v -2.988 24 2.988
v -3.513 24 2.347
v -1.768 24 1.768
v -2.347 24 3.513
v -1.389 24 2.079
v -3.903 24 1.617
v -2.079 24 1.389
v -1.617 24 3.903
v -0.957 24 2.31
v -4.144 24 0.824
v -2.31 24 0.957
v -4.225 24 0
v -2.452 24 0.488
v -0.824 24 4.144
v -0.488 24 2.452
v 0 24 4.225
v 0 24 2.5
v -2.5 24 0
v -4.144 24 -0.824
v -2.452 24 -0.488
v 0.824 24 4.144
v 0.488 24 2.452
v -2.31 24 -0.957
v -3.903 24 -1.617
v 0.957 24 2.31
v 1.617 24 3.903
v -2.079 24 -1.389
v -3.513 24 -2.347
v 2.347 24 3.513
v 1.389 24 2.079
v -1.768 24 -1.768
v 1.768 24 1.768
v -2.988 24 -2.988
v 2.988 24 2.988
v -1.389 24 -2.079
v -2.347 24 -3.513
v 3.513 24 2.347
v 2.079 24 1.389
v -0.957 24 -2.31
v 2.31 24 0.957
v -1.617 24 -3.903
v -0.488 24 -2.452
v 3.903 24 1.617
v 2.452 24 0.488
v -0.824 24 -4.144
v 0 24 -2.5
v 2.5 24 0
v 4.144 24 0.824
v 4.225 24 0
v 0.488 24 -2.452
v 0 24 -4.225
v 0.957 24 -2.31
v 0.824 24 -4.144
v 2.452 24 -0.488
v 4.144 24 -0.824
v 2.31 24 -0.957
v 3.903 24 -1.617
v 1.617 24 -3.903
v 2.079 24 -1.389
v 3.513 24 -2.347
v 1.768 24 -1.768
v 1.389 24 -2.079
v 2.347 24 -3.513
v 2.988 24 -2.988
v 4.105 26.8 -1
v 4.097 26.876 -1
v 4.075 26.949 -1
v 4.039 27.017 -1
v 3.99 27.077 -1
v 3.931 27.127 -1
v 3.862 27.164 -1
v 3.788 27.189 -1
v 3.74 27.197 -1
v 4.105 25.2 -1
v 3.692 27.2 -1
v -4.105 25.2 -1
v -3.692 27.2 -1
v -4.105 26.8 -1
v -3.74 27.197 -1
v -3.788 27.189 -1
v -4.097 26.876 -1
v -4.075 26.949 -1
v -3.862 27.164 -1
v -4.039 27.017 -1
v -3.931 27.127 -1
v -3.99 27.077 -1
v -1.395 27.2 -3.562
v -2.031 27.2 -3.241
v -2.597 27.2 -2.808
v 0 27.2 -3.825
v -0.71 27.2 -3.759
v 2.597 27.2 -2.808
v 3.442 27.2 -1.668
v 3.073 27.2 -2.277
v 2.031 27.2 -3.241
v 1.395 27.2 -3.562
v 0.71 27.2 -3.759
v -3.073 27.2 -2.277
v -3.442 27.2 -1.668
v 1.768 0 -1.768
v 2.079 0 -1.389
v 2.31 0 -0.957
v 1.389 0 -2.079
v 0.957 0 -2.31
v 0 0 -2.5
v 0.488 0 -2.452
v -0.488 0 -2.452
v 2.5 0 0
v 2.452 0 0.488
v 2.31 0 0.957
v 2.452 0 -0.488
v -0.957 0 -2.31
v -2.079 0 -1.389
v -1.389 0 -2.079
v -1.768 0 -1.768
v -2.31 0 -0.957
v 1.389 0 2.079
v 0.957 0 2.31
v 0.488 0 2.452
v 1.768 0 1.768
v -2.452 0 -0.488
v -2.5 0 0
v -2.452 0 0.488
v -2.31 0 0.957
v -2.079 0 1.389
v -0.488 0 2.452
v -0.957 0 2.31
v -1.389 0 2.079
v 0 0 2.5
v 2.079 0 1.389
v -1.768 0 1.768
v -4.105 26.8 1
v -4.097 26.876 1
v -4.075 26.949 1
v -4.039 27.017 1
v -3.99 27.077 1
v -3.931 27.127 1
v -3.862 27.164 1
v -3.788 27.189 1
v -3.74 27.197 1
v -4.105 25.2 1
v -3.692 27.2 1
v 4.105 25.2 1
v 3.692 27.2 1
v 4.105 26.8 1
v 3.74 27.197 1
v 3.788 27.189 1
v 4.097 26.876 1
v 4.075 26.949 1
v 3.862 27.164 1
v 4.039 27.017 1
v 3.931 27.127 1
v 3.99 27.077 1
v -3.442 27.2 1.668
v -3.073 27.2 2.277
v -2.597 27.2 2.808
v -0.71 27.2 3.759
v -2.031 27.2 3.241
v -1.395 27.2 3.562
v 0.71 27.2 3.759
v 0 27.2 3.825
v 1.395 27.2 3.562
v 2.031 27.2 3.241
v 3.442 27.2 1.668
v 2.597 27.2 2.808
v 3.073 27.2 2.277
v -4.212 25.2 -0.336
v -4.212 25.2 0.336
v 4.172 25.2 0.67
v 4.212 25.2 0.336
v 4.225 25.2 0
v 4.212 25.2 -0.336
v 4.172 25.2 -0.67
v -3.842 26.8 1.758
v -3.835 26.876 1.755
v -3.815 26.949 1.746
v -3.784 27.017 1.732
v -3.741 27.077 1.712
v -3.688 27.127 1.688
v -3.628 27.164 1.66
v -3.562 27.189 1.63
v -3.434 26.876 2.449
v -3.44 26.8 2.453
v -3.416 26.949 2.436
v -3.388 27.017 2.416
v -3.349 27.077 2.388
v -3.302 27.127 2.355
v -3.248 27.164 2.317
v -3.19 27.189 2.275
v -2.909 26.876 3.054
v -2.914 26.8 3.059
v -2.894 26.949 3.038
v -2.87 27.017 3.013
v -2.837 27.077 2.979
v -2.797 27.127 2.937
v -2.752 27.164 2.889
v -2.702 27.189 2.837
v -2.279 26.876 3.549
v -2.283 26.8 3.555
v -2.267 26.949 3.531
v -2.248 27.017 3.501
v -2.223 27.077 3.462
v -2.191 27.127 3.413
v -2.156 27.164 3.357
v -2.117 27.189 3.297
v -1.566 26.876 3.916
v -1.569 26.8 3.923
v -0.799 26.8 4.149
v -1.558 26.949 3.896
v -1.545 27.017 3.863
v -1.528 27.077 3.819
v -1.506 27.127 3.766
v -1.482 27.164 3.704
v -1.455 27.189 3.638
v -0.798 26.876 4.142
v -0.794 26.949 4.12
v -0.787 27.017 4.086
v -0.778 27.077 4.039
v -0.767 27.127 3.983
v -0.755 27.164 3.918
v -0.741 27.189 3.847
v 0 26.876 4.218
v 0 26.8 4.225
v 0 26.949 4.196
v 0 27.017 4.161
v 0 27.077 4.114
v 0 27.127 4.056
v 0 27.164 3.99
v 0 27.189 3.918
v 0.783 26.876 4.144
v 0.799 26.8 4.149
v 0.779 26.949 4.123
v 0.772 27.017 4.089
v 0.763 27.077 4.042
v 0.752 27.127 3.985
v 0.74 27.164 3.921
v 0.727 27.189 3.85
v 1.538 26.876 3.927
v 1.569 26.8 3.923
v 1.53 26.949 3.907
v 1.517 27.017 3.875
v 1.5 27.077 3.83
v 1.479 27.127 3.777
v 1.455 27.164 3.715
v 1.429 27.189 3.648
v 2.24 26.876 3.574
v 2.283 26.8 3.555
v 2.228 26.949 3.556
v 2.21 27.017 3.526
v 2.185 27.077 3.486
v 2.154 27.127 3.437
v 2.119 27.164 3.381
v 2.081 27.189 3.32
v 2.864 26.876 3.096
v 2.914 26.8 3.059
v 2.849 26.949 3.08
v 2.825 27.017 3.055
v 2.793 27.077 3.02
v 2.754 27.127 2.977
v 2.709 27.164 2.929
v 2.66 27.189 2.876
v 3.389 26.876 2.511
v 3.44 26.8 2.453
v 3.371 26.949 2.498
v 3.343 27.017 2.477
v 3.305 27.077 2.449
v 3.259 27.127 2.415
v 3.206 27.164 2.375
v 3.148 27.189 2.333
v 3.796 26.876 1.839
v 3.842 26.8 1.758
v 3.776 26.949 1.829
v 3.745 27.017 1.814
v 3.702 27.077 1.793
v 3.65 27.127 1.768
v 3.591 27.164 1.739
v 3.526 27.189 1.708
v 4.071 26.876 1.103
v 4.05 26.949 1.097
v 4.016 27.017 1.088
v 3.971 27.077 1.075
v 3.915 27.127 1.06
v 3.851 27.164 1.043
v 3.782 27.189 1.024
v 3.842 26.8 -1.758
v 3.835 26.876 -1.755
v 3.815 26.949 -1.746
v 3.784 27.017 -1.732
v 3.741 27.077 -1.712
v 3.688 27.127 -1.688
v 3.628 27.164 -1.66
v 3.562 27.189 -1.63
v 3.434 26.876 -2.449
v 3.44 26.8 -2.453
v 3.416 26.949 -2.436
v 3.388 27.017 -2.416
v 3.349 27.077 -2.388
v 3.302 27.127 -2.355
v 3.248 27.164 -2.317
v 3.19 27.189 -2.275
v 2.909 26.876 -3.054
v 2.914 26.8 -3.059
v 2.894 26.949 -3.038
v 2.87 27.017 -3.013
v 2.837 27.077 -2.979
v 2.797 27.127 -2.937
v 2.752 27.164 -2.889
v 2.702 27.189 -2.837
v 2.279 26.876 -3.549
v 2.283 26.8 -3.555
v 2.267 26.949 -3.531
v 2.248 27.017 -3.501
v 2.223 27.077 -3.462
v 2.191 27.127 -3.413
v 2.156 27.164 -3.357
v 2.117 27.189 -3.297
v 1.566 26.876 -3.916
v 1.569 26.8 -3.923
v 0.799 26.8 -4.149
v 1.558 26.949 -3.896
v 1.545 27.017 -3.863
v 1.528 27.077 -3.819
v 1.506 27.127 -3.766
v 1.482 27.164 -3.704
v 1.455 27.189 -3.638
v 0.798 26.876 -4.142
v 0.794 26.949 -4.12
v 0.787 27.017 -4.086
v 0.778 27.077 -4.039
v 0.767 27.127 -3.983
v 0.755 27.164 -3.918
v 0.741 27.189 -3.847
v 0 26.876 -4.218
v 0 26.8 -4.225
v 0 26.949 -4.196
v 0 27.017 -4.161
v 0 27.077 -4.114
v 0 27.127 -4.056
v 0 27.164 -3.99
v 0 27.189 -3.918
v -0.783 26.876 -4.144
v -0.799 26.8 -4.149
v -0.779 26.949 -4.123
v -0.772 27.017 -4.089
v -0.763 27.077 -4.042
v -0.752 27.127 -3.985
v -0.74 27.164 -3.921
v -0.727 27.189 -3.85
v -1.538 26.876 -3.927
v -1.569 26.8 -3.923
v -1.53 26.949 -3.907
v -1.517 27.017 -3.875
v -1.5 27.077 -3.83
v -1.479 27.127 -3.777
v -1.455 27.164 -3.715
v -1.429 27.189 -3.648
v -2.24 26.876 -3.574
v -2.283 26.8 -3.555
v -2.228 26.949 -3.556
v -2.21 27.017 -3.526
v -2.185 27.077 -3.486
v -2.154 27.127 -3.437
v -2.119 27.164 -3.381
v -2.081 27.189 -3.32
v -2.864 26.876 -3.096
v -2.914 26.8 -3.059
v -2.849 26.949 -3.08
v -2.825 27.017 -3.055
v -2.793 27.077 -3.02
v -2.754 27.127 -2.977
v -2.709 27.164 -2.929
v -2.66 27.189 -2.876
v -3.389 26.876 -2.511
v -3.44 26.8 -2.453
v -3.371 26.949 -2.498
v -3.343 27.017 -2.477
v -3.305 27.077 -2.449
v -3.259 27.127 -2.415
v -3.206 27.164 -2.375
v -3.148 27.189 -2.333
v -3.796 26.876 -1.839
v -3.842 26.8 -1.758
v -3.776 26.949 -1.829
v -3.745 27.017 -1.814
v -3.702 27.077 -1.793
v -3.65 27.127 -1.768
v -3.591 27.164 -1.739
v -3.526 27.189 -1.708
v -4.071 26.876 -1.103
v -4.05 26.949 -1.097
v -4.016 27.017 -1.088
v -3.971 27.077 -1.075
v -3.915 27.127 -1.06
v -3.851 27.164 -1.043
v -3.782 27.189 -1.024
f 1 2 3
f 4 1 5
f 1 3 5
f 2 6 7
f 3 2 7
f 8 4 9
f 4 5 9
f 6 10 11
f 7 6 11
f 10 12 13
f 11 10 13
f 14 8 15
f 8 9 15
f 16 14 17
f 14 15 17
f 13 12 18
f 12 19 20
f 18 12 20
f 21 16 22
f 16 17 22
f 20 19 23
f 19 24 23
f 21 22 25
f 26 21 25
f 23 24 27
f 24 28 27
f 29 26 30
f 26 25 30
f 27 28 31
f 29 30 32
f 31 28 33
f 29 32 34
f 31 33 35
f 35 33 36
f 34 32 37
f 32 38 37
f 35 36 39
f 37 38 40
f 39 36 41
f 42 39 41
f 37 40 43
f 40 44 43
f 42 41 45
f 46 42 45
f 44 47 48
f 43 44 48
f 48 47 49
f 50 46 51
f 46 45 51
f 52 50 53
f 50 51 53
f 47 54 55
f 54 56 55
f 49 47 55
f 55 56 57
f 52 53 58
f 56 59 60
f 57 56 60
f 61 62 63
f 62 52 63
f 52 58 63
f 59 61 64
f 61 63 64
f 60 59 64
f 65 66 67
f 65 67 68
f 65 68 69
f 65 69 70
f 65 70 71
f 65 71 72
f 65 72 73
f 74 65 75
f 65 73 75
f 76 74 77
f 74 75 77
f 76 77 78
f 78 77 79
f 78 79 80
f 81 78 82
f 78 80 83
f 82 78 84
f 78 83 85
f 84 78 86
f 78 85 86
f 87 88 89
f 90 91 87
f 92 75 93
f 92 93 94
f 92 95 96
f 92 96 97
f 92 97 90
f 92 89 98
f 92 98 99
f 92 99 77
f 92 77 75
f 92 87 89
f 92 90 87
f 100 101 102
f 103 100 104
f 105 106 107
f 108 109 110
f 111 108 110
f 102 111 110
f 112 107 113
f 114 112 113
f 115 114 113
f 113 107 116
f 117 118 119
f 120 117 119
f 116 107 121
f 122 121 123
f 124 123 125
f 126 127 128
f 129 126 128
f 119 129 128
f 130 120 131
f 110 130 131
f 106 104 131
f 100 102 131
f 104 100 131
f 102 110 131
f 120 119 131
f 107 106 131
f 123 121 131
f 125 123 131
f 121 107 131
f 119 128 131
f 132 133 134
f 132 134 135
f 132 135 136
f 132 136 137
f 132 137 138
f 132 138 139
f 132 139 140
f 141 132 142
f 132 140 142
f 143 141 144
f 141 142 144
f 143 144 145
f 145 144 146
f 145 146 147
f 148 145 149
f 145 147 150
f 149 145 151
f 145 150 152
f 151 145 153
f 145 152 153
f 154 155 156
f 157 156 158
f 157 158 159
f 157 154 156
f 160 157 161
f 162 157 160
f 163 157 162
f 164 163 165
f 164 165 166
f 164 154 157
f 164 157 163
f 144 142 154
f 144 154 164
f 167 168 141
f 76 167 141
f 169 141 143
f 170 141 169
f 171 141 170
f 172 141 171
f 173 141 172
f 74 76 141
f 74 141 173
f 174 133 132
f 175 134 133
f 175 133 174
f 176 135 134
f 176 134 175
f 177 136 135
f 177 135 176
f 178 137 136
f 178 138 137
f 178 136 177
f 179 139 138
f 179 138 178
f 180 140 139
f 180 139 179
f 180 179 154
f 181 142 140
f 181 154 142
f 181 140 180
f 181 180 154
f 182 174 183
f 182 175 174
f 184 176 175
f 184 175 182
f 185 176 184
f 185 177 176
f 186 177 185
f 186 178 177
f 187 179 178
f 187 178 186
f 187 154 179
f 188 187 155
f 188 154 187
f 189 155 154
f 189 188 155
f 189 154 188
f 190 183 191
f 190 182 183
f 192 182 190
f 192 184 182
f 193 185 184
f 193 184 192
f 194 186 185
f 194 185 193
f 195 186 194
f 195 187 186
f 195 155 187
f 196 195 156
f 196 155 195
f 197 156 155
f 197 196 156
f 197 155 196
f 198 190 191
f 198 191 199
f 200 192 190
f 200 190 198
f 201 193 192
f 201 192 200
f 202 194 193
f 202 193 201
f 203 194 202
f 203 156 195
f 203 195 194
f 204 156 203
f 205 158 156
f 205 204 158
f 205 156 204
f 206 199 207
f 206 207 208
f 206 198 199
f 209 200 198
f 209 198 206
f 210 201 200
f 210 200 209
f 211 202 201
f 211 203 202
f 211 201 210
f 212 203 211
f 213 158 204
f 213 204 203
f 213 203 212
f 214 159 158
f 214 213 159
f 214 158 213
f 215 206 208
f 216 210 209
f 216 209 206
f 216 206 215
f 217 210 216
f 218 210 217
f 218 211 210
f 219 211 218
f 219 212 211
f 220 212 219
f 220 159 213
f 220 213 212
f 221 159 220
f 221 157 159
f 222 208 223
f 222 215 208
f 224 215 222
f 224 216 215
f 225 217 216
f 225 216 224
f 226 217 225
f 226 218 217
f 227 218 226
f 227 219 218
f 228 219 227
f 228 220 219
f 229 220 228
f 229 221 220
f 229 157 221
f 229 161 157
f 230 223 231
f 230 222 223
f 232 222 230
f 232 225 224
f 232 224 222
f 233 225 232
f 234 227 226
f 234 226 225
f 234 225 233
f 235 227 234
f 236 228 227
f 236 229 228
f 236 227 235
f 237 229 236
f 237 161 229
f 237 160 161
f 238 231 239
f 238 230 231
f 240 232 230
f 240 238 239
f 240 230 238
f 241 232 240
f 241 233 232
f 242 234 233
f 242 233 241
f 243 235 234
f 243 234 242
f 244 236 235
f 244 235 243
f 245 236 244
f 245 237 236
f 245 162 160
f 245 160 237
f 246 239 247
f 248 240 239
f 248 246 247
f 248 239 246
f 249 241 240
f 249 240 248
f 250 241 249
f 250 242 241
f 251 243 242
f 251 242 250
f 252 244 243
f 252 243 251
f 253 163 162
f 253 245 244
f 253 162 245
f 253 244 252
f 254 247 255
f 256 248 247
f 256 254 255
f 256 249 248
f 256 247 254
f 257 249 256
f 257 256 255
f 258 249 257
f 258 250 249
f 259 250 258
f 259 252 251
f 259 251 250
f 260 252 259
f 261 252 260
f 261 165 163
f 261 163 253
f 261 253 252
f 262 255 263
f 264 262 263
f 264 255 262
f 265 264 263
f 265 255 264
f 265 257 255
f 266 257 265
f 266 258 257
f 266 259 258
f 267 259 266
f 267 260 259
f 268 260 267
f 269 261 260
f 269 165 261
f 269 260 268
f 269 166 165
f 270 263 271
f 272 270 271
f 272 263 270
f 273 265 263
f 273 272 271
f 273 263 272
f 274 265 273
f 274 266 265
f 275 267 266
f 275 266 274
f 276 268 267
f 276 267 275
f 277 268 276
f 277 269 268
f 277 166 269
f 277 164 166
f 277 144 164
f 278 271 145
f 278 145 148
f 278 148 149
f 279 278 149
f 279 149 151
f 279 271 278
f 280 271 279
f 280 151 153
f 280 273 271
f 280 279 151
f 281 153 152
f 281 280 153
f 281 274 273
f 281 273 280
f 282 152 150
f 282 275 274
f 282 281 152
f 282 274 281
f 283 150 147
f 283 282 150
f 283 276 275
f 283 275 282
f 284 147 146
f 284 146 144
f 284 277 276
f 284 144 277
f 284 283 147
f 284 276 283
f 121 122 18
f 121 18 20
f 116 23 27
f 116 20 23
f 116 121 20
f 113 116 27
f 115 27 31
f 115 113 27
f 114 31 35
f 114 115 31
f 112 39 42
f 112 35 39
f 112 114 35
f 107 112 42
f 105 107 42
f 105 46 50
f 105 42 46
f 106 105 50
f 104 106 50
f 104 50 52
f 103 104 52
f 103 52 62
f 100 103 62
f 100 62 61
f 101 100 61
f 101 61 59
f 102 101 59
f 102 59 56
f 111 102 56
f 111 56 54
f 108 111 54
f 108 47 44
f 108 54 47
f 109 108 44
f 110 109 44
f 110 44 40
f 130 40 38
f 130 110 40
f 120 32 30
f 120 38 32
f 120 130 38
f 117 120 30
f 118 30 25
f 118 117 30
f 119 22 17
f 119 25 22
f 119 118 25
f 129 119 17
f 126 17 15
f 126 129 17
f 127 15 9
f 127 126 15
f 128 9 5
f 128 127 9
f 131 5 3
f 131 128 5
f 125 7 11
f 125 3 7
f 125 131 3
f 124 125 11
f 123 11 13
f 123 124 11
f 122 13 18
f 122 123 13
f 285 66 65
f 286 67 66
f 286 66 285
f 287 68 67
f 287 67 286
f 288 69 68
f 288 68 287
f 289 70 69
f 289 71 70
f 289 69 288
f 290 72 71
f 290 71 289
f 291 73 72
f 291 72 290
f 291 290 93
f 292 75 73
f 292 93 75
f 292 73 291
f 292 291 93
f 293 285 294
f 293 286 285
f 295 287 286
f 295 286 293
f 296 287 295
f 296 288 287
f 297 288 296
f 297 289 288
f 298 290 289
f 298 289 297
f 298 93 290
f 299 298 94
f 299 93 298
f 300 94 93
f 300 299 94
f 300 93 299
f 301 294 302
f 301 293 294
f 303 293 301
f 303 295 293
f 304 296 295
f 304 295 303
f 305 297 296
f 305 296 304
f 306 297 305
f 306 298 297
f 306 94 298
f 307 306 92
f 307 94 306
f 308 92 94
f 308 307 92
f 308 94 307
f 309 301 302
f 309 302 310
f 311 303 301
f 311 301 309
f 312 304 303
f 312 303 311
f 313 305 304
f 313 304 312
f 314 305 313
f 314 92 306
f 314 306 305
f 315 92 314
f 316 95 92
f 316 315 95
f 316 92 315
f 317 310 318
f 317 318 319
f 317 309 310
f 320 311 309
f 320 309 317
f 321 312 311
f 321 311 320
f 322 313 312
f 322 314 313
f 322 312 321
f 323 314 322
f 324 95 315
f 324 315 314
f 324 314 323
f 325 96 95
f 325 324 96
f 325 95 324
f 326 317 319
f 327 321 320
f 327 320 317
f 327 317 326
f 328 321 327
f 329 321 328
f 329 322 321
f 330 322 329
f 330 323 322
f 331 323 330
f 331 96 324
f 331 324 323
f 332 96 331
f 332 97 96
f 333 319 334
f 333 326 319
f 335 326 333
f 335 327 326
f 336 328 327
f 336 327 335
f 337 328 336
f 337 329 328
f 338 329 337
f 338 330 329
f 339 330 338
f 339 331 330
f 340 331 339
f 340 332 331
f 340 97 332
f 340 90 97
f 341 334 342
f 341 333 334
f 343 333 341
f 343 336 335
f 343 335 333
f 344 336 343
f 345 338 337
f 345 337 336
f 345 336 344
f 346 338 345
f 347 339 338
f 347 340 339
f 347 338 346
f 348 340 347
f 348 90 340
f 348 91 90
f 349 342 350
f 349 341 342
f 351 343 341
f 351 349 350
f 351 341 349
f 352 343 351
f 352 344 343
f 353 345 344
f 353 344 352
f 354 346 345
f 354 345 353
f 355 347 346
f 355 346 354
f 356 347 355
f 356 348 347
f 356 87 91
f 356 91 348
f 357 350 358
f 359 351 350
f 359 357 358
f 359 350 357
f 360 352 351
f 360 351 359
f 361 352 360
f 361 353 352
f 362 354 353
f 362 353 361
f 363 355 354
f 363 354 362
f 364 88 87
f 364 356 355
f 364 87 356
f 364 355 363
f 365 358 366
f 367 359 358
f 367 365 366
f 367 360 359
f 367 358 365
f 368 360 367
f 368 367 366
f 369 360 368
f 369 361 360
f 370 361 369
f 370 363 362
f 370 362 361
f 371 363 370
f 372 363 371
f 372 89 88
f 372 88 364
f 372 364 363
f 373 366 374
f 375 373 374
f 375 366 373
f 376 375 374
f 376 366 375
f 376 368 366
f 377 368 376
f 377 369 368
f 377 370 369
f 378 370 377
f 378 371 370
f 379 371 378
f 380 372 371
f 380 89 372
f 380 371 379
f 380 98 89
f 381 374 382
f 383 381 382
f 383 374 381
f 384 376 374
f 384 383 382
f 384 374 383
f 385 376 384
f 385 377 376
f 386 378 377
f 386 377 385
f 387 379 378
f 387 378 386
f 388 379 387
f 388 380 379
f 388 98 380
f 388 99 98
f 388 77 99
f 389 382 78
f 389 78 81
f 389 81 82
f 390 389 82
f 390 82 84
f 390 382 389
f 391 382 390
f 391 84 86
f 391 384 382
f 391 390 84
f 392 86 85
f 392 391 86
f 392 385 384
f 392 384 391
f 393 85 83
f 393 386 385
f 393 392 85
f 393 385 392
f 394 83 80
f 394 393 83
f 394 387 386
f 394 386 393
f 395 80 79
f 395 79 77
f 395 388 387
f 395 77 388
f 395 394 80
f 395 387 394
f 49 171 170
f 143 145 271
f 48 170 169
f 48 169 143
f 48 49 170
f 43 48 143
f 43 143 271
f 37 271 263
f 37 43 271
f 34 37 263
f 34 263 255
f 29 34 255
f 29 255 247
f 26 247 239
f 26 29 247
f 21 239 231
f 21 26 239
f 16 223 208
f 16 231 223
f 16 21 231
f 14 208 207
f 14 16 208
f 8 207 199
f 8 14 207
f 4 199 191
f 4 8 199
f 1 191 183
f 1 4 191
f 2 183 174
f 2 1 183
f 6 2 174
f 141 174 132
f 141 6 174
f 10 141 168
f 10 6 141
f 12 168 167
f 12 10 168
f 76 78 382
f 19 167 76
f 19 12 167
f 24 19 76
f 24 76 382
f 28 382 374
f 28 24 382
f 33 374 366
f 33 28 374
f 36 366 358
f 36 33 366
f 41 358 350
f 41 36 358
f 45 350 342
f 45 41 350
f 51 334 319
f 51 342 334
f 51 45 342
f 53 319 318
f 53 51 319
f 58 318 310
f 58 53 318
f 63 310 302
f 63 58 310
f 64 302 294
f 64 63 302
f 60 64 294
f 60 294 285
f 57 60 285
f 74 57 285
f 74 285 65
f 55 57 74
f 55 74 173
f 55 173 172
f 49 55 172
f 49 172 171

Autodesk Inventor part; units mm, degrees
ref_plane "YZ Plane" through (0, 0, 0) normal (1, 0, 0) x (0, 1, 0)
ref_plane "XZ Plane" through (0, 0, 0) normal (0, 1, 0) x (-1, 0, 0)
ref_plane "XY Plane" through (0, 0, 0) normal (0, 0, 1) x (1, 0, 0)
sketch "Sketch1" plane through (0, 0, 0) normal (0, 1, 0) x (-1, 0, 0)
  circle A0 centre (0, 0) radius 2.5
  dimension "d0" = 5
extrude "Extrusion1" add sketch "Sketch1" along normal blind 24
sketch "Sketch2" plane through (0, 24, 0) normal (0, 1, 0) x (1, 0, 0)
  circle A0 centre (0, 0) radius 4.225
  dimension "d3" = 8.45
extrude "Extrusion2" add sketch "Sketch2" along normal blind 3.2
sketch "Sketch3" plane through (0, 27.2, 0) normal (0, 1, 0) x (1, 0, 0)
  line L0 (-5, -1) -> (5, -1)
  line L1 (5, -1) -> (5, 1)
  line L2 (5, 1) -> (-5, 1)
  line L3 (-5, 1) -> (-5, -1)
  point P0 (0, 0)
  dimension "d6" = 10
  dimension "d7" = 2
  dimension "d8" = 5
  dimension "d9" = 1
extrude "Extrusion3" cut sketch "Sketch3" against normal blind 2
fillet "Fillet1" radius 0.4 2 edges at (0, 27.2, 4.225) (0, 27.2, -4.225)
properties part number "machine_screw_5_x_24_mm"
